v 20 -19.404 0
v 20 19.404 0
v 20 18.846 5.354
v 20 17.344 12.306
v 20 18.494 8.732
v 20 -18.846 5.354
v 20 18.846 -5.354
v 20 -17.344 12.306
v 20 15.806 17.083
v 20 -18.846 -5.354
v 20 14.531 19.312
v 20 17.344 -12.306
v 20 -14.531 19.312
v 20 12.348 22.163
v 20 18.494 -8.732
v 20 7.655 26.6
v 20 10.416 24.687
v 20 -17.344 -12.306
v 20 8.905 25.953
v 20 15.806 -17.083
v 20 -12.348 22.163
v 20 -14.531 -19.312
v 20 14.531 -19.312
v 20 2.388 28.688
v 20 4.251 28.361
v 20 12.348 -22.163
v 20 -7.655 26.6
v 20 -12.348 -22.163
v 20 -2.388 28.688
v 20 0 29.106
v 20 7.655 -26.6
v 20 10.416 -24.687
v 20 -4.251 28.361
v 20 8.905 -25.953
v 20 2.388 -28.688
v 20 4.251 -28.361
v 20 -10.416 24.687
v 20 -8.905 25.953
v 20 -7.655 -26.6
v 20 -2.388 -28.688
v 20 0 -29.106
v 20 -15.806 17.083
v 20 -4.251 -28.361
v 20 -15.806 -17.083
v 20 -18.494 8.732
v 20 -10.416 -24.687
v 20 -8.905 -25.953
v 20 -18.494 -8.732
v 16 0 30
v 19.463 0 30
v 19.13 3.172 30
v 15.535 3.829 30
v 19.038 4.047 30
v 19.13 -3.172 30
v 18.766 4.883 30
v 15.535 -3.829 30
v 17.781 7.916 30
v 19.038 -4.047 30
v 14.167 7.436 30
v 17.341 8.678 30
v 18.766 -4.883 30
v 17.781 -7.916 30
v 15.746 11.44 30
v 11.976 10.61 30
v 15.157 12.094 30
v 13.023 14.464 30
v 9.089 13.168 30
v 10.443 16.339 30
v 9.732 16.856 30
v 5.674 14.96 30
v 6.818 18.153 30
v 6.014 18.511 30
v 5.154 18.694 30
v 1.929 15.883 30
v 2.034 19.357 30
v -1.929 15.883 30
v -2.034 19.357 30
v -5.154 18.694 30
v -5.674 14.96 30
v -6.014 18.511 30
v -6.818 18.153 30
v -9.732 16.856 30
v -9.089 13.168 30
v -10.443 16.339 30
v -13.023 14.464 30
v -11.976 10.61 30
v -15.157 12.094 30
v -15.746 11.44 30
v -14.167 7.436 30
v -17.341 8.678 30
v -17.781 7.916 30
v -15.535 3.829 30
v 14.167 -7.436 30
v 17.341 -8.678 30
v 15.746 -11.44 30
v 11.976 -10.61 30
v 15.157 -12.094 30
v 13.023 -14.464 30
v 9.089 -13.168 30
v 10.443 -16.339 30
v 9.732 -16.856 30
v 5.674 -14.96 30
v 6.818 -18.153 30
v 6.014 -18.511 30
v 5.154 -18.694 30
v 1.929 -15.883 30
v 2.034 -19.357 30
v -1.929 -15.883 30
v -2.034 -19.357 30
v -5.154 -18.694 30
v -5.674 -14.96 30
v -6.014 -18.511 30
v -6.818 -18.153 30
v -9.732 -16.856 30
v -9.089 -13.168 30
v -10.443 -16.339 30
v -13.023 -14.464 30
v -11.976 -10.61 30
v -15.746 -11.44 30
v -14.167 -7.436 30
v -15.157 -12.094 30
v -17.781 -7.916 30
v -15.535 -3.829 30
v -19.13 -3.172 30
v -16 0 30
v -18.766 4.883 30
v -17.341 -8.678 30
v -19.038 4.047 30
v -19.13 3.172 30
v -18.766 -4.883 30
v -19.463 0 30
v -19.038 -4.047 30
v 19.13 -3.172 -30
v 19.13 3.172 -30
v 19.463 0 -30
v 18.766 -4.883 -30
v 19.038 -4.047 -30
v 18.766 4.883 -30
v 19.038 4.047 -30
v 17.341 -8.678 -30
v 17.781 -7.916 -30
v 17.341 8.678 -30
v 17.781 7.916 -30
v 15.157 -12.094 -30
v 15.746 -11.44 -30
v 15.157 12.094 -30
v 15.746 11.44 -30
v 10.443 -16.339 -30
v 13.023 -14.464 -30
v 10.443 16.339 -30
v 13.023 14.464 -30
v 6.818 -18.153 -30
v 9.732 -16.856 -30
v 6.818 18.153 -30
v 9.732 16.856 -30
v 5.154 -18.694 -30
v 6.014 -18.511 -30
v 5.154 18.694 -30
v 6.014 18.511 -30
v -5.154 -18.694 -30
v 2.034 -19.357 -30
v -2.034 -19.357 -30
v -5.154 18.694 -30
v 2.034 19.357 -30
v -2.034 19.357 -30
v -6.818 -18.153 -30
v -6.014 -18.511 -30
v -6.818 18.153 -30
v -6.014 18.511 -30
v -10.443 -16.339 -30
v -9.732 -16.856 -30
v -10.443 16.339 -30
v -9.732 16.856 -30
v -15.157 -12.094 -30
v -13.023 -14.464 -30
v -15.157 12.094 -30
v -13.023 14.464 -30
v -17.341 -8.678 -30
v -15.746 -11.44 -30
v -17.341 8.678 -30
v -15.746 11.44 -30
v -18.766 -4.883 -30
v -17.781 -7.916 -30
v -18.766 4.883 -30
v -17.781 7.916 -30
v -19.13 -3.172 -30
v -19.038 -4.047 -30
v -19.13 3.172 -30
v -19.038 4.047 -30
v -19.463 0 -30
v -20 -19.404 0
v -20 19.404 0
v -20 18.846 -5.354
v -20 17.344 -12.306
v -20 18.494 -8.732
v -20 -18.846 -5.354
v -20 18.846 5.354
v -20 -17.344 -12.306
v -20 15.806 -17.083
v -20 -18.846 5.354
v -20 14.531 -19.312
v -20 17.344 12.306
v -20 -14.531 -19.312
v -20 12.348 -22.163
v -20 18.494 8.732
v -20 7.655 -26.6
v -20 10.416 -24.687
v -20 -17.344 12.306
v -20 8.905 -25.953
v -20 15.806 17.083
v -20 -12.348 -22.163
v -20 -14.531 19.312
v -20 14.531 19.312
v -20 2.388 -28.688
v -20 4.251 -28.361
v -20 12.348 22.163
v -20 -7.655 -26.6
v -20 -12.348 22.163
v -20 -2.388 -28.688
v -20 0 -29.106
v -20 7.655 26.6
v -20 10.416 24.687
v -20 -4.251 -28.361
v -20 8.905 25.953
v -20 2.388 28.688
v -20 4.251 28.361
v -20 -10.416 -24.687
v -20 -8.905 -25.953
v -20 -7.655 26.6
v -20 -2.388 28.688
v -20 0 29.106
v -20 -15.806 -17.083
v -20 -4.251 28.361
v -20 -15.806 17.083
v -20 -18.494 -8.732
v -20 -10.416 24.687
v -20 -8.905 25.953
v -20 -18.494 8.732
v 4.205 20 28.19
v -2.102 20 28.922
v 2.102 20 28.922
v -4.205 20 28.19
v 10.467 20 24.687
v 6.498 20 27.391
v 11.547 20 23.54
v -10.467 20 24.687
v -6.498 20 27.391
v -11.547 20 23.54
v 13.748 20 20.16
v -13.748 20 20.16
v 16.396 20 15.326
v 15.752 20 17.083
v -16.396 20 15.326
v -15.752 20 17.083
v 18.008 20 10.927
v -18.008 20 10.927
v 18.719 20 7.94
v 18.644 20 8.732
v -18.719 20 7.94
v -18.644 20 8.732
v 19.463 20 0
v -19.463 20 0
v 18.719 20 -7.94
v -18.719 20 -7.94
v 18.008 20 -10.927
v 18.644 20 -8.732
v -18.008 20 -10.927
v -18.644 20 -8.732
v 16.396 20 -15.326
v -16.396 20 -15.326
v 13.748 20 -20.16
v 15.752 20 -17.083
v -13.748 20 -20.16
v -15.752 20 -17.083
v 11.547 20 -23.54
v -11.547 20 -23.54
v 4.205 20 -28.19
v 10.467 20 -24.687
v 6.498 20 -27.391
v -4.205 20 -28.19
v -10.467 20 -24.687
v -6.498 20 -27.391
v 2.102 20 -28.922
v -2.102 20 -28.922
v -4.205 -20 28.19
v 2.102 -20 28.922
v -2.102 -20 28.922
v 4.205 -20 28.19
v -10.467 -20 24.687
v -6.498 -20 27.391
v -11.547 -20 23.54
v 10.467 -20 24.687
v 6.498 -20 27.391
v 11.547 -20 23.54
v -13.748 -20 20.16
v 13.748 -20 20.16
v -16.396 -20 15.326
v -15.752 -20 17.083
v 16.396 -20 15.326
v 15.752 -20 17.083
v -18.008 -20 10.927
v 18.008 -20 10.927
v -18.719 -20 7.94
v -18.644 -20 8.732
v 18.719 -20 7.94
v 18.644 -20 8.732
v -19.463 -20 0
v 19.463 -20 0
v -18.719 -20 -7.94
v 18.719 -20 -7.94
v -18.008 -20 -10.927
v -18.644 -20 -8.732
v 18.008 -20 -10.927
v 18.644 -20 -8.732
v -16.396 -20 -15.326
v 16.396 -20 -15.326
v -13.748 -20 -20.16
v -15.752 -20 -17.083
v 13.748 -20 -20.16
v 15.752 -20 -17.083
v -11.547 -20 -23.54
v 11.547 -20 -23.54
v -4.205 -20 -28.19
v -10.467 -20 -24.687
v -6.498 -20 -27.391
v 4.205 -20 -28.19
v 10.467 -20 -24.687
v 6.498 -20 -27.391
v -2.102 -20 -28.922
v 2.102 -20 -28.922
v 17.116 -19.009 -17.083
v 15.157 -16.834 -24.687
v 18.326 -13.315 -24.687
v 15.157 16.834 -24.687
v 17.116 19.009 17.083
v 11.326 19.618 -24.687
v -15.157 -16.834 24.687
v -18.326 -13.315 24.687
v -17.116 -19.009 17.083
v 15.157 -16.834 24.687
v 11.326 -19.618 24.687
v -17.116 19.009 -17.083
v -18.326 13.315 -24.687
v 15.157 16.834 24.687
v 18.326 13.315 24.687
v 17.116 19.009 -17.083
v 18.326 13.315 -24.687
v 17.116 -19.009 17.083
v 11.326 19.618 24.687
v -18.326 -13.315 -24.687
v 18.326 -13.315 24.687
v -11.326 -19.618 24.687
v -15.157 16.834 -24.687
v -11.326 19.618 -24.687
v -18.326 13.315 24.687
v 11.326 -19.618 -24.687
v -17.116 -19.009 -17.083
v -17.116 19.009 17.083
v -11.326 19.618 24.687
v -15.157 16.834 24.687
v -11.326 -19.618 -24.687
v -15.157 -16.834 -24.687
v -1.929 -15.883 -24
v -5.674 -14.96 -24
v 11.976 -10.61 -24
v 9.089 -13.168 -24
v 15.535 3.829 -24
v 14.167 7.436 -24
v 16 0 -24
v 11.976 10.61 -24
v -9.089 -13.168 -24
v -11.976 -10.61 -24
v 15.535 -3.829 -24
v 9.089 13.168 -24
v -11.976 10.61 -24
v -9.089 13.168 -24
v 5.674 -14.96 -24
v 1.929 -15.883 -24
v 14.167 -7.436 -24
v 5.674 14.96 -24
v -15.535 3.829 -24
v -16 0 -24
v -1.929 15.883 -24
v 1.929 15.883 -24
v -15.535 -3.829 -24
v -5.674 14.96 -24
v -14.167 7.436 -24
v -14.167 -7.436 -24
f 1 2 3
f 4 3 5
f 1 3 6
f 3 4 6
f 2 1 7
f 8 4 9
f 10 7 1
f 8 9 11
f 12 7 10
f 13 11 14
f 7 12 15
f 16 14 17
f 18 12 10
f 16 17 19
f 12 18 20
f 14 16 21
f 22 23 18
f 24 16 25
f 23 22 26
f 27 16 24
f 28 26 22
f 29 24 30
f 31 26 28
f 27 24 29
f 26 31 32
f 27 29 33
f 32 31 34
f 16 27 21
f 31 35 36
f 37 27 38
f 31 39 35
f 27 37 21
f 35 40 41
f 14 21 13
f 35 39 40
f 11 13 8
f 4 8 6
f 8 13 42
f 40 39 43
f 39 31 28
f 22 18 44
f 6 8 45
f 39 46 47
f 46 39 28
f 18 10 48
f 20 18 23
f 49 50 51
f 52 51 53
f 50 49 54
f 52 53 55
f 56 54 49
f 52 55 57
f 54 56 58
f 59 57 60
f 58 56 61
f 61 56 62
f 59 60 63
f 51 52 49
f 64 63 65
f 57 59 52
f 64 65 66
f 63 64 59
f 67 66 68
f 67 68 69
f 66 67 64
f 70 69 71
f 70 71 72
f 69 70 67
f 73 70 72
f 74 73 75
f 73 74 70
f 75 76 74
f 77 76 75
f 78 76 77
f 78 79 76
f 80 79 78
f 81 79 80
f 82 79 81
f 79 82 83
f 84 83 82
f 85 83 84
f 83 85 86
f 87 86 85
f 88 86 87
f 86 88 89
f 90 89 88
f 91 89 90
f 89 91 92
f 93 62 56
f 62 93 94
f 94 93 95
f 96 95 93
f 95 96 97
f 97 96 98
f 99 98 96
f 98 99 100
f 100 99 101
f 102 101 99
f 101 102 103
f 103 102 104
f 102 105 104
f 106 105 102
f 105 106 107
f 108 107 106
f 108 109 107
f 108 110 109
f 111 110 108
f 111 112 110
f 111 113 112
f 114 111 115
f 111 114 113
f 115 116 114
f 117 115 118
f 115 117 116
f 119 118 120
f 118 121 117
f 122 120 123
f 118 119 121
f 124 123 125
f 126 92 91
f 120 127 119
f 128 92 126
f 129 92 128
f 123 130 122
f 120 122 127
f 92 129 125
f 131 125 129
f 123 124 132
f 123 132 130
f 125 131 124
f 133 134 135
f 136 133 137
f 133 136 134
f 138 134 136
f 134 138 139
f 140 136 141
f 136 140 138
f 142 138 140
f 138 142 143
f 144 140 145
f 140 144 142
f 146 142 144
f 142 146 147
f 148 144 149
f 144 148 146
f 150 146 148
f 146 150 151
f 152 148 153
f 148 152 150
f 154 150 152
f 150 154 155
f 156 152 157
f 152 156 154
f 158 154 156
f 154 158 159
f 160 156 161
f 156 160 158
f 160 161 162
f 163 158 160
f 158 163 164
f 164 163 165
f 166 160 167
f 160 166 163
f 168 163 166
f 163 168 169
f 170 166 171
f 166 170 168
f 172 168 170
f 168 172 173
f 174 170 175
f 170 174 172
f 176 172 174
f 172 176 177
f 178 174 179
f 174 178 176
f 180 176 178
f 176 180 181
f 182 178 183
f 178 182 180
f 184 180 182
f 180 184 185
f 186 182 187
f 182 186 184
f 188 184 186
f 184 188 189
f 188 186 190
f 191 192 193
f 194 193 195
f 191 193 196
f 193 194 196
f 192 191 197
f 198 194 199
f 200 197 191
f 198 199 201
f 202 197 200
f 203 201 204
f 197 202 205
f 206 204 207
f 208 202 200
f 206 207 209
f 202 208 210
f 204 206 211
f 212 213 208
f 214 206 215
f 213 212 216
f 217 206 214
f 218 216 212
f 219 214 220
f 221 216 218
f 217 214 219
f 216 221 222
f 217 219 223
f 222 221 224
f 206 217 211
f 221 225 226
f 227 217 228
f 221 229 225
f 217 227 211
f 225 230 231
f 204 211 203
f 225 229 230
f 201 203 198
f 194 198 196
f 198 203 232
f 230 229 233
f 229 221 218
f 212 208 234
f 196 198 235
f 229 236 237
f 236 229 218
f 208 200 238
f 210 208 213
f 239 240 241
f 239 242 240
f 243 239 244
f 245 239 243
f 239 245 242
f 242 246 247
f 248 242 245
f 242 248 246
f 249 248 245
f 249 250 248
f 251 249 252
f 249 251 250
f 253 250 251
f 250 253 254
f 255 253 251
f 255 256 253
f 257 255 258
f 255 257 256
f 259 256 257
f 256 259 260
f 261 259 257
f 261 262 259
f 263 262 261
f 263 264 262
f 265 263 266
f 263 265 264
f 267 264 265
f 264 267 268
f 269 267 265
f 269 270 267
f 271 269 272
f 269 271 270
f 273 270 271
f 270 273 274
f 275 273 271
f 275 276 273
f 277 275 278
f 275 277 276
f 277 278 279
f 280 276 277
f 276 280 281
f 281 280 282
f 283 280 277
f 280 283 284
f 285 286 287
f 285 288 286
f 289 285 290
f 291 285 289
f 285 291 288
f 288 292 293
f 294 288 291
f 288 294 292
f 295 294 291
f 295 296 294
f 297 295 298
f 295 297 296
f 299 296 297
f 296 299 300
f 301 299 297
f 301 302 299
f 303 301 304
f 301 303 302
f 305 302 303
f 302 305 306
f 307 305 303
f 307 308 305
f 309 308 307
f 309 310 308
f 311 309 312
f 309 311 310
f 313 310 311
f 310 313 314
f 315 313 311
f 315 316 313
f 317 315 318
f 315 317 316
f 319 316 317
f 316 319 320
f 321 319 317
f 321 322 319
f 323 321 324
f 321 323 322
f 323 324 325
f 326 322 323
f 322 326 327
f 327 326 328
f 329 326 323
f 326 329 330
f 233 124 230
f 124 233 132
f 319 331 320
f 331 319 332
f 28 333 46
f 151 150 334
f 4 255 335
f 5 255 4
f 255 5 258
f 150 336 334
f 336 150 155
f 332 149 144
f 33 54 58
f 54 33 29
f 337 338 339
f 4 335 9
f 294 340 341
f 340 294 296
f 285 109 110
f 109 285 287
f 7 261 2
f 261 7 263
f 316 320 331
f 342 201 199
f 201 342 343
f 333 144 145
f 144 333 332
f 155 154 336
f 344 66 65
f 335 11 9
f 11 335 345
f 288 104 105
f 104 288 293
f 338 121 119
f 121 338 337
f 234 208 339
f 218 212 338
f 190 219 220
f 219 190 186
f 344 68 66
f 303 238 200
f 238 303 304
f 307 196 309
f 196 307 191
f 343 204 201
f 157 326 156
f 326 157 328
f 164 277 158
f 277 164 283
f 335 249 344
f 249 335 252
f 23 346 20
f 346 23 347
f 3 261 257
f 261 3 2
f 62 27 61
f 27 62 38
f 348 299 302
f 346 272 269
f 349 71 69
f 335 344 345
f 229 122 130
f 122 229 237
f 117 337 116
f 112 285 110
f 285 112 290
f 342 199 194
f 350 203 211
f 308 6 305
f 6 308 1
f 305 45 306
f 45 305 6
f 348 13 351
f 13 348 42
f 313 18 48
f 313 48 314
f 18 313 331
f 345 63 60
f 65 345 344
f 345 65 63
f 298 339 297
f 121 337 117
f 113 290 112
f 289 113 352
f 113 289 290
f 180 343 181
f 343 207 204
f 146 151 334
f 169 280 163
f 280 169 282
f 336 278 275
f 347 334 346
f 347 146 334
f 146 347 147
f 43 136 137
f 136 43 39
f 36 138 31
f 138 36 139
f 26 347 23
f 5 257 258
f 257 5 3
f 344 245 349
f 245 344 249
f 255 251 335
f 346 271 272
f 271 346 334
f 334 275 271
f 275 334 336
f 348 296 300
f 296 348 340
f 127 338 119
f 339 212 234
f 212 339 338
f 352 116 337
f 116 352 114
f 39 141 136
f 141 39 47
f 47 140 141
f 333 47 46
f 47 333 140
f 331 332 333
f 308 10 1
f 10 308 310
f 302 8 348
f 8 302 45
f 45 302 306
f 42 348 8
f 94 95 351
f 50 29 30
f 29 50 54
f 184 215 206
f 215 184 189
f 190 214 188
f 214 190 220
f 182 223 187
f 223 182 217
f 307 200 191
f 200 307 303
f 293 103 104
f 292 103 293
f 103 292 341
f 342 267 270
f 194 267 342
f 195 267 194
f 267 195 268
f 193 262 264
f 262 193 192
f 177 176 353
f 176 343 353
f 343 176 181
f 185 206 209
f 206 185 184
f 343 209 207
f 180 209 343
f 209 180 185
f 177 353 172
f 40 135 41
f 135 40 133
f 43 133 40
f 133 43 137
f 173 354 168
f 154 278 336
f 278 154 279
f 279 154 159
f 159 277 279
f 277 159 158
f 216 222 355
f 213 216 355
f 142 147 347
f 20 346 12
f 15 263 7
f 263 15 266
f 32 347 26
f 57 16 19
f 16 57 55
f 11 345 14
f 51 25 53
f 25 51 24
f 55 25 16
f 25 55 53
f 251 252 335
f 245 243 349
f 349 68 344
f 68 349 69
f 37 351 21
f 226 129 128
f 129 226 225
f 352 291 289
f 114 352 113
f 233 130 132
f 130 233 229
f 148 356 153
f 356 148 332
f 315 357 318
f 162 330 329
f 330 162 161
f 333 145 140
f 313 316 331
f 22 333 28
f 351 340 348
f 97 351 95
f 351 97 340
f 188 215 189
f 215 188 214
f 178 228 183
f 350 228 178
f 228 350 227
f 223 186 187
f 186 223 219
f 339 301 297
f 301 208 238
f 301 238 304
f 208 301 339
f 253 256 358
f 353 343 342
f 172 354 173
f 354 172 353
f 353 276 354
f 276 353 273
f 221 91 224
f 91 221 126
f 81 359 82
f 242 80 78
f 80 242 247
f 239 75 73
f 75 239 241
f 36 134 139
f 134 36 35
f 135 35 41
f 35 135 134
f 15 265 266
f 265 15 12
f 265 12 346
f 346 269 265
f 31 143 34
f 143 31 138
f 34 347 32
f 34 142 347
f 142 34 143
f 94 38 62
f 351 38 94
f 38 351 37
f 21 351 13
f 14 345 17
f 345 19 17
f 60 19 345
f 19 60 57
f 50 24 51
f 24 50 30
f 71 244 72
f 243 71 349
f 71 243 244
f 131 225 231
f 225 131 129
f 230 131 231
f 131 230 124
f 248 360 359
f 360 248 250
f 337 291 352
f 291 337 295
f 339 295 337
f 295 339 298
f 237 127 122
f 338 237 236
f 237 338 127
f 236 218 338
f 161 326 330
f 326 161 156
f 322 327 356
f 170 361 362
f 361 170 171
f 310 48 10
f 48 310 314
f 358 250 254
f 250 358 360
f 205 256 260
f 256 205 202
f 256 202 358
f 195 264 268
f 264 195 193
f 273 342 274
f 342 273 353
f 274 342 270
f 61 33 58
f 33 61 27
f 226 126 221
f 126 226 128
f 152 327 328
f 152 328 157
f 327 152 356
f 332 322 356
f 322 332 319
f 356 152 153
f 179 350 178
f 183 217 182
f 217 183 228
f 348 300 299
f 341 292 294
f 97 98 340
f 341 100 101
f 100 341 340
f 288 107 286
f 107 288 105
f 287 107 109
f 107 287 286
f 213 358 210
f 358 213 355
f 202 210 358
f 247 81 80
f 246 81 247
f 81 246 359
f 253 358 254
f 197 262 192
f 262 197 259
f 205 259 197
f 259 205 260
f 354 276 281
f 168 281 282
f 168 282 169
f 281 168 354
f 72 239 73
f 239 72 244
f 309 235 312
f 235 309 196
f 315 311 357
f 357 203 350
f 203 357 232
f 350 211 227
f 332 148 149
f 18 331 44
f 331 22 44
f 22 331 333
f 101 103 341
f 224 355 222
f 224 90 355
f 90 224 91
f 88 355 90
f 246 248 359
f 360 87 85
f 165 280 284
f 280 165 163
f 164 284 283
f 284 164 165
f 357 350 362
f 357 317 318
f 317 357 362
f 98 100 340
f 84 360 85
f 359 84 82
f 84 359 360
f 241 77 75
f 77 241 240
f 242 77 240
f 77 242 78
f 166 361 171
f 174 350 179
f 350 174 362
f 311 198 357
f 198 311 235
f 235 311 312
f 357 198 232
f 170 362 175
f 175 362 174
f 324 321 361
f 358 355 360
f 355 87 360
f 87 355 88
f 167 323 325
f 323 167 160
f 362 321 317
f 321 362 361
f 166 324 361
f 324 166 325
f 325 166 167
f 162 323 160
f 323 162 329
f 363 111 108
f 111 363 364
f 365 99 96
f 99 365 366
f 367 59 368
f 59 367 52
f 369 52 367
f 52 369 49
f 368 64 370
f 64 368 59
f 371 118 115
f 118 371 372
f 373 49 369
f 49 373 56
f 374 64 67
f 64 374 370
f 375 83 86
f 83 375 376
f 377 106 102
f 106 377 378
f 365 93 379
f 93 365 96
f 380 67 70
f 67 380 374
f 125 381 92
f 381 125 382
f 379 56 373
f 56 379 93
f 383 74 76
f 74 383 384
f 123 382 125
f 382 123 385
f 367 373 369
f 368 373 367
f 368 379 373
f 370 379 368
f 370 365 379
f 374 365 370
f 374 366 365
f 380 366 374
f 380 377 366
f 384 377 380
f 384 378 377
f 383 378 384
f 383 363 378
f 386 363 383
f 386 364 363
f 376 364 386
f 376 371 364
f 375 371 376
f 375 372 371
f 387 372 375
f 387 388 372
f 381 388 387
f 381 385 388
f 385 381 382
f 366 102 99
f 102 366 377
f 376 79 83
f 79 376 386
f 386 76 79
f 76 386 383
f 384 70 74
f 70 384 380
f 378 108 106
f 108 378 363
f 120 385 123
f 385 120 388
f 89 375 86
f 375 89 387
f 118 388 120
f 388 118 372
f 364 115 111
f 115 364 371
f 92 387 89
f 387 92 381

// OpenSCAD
scale([2,2,3]) {
difference() {
intersection () {
    cube ( [20,20,20], center=true) ;
  sphere(14) ;
   
}
translate([ 0,0,-8]) 
cylinder(h=22,r=8);
}
}
